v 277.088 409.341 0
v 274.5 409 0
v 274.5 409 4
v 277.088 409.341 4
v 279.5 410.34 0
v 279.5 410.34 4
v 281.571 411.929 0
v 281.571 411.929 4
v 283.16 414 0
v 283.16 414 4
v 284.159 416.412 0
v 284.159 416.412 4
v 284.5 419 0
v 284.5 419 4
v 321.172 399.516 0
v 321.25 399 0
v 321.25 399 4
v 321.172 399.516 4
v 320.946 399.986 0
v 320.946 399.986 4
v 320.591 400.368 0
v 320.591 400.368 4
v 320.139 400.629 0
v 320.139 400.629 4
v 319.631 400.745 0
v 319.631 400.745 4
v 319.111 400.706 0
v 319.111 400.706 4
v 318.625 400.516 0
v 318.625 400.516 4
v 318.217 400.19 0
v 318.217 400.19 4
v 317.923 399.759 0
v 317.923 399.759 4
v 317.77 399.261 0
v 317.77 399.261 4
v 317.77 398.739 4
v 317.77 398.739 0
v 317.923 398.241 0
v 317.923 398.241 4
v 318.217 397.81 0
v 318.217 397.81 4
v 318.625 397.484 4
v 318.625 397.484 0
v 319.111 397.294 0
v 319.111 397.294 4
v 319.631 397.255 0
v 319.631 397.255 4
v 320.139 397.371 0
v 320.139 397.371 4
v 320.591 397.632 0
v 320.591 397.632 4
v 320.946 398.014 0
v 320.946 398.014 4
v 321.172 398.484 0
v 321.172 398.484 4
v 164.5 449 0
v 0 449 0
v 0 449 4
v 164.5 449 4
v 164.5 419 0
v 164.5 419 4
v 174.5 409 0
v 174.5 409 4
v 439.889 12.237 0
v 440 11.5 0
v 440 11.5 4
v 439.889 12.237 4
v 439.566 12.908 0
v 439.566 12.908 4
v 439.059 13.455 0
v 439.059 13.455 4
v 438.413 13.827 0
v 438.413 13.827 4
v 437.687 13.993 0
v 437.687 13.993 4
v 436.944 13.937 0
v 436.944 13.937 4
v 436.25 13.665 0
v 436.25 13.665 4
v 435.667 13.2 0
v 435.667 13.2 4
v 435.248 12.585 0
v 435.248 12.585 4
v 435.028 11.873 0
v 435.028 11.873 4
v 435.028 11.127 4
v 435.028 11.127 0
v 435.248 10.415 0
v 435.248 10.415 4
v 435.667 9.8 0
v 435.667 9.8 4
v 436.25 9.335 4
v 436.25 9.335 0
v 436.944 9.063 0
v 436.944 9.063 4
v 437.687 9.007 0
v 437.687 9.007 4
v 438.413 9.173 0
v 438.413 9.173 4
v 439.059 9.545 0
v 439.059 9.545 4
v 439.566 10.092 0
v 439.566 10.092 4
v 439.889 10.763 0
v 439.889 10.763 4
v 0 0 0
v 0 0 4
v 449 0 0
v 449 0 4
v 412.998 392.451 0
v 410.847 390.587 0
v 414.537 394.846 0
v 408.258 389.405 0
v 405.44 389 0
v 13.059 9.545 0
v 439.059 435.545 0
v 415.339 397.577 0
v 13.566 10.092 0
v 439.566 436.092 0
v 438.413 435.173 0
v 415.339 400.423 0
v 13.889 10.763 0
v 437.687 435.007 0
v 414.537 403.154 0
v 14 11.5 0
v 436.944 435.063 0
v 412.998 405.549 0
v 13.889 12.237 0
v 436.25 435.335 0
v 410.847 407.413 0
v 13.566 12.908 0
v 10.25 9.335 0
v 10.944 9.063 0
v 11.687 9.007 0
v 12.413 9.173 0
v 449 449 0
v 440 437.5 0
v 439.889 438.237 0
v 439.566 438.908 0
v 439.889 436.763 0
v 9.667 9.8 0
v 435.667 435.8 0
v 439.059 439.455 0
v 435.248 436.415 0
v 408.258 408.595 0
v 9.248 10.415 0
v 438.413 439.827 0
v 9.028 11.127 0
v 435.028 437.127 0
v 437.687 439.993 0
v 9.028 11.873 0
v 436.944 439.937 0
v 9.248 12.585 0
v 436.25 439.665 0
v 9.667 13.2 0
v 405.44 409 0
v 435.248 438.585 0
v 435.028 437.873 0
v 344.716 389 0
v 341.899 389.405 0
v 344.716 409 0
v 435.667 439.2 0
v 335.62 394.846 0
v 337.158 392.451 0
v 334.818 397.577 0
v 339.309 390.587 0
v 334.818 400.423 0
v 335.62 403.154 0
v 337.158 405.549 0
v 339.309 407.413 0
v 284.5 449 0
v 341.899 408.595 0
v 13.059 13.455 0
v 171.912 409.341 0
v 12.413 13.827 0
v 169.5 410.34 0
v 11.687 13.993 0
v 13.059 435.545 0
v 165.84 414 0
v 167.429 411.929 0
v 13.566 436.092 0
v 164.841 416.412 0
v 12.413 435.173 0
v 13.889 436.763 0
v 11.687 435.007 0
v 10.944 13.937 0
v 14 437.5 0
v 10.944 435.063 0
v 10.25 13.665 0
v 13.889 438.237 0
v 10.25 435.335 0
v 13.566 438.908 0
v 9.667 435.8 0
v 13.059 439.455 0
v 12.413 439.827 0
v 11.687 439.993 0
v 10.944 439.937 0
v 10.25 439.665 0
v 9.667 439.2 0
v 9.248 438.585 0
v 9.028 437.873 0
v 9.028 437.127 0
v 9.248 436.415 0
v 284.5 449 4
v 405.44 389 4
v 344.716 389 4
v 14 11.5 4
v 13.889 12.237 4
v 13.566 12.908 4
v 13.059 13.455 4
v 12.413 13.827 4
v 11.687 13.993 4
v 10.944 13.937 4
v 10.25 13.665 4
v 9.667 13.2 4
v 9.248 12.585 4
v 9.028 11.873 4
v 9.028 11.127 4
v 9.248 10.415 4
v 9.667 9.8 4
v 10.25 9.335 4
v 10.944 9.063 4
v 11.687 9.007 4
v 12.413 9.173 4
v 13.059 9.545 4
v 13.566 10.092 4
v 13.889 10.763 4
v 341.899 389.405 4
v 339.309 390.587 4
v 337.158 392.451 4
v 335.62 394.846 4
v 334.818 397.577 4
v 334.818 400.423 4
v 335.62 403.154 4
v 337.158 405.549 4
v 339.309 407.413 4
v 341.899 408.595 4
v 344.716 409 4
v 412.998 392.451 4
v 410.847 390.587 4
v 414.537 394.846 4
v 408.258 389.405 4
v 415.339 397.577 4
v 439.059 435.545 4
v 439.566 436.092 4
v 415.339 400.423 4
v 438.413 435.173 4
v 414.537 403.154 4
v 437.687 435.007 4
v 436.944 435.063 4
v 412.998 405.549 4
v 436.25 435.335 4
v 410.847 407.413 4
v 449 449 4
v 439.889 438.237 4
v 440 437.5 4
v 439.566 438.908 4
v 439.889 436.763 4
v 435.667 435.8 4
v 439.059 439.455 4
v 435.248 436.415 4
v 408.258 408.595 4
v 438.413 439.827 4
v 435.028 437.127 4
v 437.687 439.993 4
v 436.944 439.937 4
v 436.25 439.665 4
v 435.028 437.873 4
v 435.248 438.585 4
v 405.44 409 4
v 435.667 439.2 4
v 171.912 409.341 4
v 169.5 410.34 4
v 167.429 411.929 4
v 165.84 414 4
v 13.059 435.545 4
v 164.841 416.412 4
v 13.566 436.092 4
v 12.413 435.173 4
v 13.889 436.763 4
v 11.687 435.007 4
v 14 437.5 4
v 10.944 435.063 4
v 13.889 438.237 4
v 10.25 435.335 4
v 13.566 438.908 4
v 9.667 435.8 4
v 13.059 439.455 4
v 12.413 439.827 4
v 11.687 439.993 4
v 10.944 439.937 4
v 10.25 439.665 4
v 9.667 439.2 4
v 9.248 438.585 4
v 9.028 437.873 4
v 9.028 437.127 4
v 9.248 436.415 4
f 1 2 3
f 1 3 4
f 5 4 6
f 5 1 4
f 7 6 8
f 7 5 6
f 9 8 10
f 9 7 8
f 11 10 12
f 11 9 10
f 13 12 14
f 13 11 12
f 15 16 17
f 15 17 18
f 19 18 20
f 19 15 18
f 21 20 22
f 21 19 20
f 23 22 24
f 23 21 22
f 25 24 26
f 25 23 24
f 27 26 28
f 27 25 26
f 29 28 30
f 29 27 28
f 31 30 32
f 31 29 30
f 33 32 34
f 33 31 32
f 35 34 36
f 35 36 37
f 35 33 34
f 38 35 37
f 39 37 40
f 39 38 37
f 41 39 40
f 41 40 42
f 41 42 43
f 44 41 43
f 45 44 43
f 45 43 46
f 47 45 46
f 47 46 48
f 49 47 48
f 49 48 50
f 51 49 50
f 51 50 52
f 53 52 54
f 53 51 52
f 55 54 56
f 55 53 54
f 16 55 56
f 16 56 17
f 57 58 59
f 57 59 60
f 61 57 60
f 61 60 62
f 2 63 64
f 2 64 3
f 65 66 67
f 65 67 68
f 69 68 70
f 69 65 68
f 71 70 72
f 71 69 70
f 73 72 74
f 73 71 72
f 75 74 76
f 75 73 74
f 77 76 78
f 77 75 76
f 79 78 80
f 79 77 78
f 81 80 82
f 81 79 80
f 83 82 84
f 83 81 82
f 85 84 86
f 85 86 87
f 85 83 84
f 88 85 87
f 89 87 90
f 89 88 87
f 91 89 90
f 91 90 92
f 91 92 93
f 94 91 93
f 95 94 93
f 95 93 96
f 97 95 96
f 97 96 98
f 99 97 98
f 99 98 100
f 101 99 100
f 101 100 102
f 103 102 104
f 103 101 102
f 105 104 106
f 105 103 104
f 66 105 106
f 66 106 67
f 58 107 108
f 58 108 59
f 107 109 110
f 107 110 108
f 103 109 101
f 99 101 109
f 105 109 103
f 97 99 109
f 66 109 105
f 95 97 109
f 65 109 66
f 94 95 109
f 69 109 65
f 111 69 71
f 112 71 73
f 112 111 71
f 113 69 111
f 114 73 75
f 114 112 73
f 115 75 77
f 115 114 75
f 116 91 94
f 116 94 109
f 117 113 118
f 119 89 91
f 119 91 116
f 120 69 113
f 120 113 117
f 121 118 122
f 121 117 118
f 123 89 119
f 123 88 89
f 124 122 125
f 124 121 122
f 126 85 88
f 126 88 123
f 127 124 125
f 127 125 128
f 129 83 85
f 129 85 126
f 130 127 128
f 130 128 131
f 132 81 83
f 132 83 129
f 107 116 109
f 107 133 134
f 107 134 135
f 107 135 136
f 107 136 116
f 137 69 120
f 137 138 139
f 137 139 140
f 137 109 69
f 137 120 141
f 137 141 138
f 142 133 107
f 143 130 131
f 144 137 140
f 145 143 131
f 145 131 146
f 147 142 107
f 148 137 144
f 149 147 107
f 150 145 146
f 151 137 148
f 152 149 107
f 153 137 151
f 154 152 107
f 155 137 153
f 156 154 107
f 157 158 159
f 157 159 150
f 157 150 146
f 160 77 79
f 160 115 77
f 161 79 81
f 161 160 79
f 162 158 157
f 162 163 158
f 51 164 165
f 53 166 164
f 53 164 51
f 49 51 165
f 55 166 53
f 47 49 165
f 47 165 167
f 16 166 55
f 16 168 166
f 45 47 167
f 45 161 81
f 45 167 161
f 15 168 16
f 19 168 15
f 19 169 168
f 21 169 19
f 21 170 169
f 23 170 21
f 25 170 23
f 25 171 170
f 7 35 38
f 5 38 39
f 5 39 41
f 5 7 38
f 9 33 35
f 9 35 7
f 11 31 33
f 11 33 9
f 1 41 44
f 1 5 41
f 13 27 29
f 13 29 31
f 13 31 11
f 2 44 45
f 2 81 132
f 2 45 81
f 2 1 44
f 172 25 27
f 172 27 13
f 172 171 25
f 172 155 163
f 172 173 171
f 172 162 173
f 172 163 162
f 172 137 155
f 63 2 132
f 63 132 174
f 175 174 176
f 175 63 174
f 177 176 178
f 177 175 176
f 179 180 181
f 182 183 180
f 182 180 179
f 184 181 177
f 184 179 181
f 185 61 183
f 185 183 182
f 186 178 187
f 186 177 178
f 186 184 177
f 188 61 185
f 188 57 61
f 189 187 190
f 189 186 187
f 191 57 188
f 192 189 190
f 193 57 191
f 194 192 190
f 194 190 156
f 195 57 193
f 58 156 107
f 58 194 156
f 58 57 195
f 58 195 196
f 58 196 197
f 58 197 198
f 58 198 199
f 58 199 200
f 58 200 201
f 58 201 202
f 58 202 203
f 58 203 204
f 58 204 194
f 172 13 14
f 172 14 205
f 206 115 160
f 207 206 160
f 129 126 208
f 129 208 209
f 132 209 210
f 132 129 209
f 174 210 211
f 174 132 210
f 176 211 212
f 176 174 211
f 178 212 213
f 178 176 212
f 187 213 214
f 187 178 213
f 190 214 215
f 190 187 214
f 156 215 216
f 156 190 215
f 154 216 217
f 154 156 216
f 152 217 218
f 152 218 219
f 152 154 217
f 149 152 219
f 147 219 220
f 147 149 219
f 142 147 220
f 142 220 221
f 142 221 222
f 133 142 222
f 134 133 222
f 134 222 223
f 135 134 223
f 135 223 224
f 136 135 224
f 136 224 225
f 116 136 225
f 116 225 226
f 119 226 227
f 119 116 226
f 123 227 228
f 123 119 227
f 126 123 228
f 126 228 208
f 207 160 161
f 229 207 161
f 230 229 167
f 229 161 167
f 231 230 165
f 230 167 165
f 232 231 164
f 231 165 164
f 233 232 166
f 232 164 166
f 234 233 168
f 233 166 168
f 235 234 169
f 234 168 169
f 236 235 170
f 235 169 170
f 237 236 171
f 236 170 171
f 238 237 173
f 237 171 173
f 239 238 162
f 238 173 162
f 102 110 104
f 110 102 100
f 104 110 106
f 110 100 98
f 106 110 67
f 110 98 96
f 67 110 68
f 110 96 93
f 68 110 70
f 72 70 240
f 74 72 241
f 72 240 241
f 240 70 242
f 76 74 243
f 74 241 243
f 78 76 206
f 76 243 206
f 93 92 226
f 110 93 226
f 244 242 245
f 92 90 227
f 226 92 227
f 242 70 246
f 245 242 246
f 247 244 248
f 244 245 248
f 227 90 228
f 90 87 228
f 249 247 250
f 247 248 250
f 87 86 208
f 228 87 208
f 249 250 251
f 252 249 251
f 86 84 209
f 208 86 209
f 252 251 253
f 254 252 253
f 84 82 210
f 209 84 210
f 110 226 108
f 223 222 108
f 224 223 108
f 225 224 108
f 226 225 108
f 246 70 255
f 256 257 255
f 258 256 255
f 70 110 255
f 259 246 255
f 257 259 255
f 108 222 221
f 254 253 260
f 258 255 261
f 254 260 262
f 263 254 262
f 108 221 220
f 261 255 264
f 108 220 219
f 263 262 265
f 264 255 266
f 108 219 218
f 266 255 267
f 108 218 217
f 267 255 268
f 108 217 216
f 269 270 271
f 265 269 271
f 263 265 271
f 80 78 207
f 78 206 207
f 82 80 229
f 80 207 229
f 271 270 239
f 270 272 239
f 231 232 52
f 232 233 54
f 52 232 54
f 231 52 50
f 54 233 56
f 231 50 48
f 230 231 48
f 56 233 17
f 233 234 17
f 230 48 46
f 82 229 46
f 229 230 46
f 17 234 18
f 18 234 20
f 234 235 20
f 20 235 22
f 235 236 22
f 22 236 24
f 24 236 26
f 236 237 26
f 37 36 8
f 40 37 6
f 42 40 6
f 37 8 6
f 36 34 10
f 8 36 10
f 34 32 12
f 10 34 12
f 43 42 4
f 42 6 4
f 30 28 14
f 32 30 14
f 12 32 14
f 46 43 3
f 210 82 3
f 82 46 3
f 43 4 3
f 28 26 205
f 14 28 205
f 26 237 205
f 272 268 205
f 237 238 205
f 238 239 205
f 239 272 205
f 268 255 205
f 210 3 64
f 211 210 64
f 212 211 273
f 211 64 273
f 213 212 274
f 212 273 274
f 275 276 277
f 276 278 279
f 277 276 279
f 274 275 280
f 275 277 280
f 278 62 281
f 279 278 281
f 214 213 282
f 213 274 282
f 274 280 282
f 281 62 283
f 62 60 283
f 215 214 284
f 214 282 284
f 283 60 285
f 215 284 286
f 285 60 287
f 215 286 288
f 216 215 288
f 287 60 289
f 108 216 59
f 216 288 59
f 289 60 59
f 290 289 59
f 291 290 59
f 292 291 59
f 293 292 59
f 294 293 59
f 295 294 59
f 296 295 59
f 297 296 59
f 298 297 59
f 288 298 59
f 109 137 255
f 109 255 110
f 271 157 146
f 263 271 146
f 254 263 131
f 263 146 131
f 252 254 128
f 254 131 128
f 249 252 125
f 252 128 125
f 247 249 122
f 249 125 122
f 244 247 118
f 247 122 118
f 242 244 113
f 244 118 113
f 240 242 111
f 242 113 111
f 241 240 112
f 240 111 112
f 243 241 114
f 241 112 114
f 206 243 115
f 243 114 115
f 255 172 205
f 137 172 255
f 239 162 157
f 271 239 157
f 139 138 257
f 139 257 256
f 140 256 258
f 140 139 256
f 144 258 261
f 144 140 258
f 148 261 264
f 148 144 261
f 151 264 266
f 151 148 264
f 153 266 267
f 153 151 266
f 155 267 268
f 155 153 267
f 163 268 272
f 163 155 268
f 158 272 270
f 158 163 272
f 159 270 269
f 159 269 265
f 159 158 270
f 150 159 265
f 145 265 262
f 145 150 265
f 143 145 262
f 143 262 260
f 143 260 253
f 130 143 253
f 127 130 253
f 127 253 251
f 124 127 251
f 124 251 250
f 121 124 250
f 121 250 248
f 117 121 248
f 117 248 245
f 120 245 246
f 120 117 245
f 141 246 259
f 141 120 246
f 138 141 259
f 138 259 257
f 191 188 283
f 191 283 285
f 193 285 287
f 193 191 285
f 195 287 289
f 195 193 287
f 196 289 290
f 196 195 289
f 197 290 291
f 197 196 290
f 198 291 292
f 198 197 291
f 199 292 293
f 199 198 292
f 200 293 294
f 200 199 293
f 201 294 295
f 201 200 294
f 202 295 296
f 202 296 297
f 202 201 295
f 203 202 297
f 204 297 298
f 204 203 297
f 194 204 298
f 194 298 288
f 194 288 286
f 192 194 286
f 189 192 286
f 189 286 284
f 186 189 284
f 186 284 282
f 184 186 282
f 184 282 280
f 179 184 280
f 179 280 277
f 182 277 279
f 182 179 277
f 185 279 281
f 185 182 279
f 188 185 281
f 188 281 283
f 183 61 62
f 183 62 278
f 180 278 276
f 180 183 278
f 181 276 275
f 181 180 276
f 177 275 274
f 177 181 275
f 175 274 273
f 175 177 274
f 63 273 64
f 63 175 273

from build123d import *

# Parameters (mm, degrees)
SCHIZZO1_R                   = 2.5
SCHIZZO1_R_2                 = 1.75
ESTRUSIONE_ESTRUSIONE1_DEPTH = 4


with BuildPart() as part:
    # Schizzo1 → Estrusione-Estrusione1 (new body)
    with BuildSketch(Plane.XY):
        with BuildLine():
            Line((0, 0), (0, 449))
            Line((0, 449), (164.5, 449))
            Line((164.5, 449), (164.5, 419))
            ThreePointArc((164.5, 419), (167.428932188, 411.928932188), (174.5, 409))
            Line((174.5, 409), (274.5, 409))
            ThreePointArc((274.5, 409), (281.571067812, 411.928932188), (284.5, 419))
            Line((284.5, 419), (284.5, 449))
            Line((284.5, 449), (449, 449))
            Line((449, 449), (449, 0))
            Line((449, 0), (0, 0))
        make_face()
        with Locations((11.5, 11.5)):
            Circle(SCHIZZO1_R, mode=Mode.SUBTRACT)
        with Locations((437.5, 11.5)):
            Circle(SCHIZZO1_R, mode=Mode.SUBTRACT)
        with Locations((437.5, 437.5)):
            Circle(SCHIZZO1_R, mode=Mode.SUBTRACT)
        with Locations((11.5, 437.5)):
            Circle(SCHIZZO1_R, mode=Mode.SUBTRACT)
        with Locations((319.5, 399)):
            Circle(SCHIZZO1_R_2, mode=Mode.SUBTRACT)
        with BuildLine():
            Line((344.715899345, 409), (405.440355678, 409))
            ThreePointArc((405.440355678, 409), (415.440355678, 399), (405.440355678, 389))
            Line((405.440355678, 389), (344.715899345, 389))
            ThreePointArc((344.715899345, 389), (334.715899345, 399), (344.715899345, 409))
        make_face(mode=Mode.SUBTRACT)
    extrude(amount=ESTRUSIONE_ESTRUSIONE1_DEPTH)


solid = part.part
